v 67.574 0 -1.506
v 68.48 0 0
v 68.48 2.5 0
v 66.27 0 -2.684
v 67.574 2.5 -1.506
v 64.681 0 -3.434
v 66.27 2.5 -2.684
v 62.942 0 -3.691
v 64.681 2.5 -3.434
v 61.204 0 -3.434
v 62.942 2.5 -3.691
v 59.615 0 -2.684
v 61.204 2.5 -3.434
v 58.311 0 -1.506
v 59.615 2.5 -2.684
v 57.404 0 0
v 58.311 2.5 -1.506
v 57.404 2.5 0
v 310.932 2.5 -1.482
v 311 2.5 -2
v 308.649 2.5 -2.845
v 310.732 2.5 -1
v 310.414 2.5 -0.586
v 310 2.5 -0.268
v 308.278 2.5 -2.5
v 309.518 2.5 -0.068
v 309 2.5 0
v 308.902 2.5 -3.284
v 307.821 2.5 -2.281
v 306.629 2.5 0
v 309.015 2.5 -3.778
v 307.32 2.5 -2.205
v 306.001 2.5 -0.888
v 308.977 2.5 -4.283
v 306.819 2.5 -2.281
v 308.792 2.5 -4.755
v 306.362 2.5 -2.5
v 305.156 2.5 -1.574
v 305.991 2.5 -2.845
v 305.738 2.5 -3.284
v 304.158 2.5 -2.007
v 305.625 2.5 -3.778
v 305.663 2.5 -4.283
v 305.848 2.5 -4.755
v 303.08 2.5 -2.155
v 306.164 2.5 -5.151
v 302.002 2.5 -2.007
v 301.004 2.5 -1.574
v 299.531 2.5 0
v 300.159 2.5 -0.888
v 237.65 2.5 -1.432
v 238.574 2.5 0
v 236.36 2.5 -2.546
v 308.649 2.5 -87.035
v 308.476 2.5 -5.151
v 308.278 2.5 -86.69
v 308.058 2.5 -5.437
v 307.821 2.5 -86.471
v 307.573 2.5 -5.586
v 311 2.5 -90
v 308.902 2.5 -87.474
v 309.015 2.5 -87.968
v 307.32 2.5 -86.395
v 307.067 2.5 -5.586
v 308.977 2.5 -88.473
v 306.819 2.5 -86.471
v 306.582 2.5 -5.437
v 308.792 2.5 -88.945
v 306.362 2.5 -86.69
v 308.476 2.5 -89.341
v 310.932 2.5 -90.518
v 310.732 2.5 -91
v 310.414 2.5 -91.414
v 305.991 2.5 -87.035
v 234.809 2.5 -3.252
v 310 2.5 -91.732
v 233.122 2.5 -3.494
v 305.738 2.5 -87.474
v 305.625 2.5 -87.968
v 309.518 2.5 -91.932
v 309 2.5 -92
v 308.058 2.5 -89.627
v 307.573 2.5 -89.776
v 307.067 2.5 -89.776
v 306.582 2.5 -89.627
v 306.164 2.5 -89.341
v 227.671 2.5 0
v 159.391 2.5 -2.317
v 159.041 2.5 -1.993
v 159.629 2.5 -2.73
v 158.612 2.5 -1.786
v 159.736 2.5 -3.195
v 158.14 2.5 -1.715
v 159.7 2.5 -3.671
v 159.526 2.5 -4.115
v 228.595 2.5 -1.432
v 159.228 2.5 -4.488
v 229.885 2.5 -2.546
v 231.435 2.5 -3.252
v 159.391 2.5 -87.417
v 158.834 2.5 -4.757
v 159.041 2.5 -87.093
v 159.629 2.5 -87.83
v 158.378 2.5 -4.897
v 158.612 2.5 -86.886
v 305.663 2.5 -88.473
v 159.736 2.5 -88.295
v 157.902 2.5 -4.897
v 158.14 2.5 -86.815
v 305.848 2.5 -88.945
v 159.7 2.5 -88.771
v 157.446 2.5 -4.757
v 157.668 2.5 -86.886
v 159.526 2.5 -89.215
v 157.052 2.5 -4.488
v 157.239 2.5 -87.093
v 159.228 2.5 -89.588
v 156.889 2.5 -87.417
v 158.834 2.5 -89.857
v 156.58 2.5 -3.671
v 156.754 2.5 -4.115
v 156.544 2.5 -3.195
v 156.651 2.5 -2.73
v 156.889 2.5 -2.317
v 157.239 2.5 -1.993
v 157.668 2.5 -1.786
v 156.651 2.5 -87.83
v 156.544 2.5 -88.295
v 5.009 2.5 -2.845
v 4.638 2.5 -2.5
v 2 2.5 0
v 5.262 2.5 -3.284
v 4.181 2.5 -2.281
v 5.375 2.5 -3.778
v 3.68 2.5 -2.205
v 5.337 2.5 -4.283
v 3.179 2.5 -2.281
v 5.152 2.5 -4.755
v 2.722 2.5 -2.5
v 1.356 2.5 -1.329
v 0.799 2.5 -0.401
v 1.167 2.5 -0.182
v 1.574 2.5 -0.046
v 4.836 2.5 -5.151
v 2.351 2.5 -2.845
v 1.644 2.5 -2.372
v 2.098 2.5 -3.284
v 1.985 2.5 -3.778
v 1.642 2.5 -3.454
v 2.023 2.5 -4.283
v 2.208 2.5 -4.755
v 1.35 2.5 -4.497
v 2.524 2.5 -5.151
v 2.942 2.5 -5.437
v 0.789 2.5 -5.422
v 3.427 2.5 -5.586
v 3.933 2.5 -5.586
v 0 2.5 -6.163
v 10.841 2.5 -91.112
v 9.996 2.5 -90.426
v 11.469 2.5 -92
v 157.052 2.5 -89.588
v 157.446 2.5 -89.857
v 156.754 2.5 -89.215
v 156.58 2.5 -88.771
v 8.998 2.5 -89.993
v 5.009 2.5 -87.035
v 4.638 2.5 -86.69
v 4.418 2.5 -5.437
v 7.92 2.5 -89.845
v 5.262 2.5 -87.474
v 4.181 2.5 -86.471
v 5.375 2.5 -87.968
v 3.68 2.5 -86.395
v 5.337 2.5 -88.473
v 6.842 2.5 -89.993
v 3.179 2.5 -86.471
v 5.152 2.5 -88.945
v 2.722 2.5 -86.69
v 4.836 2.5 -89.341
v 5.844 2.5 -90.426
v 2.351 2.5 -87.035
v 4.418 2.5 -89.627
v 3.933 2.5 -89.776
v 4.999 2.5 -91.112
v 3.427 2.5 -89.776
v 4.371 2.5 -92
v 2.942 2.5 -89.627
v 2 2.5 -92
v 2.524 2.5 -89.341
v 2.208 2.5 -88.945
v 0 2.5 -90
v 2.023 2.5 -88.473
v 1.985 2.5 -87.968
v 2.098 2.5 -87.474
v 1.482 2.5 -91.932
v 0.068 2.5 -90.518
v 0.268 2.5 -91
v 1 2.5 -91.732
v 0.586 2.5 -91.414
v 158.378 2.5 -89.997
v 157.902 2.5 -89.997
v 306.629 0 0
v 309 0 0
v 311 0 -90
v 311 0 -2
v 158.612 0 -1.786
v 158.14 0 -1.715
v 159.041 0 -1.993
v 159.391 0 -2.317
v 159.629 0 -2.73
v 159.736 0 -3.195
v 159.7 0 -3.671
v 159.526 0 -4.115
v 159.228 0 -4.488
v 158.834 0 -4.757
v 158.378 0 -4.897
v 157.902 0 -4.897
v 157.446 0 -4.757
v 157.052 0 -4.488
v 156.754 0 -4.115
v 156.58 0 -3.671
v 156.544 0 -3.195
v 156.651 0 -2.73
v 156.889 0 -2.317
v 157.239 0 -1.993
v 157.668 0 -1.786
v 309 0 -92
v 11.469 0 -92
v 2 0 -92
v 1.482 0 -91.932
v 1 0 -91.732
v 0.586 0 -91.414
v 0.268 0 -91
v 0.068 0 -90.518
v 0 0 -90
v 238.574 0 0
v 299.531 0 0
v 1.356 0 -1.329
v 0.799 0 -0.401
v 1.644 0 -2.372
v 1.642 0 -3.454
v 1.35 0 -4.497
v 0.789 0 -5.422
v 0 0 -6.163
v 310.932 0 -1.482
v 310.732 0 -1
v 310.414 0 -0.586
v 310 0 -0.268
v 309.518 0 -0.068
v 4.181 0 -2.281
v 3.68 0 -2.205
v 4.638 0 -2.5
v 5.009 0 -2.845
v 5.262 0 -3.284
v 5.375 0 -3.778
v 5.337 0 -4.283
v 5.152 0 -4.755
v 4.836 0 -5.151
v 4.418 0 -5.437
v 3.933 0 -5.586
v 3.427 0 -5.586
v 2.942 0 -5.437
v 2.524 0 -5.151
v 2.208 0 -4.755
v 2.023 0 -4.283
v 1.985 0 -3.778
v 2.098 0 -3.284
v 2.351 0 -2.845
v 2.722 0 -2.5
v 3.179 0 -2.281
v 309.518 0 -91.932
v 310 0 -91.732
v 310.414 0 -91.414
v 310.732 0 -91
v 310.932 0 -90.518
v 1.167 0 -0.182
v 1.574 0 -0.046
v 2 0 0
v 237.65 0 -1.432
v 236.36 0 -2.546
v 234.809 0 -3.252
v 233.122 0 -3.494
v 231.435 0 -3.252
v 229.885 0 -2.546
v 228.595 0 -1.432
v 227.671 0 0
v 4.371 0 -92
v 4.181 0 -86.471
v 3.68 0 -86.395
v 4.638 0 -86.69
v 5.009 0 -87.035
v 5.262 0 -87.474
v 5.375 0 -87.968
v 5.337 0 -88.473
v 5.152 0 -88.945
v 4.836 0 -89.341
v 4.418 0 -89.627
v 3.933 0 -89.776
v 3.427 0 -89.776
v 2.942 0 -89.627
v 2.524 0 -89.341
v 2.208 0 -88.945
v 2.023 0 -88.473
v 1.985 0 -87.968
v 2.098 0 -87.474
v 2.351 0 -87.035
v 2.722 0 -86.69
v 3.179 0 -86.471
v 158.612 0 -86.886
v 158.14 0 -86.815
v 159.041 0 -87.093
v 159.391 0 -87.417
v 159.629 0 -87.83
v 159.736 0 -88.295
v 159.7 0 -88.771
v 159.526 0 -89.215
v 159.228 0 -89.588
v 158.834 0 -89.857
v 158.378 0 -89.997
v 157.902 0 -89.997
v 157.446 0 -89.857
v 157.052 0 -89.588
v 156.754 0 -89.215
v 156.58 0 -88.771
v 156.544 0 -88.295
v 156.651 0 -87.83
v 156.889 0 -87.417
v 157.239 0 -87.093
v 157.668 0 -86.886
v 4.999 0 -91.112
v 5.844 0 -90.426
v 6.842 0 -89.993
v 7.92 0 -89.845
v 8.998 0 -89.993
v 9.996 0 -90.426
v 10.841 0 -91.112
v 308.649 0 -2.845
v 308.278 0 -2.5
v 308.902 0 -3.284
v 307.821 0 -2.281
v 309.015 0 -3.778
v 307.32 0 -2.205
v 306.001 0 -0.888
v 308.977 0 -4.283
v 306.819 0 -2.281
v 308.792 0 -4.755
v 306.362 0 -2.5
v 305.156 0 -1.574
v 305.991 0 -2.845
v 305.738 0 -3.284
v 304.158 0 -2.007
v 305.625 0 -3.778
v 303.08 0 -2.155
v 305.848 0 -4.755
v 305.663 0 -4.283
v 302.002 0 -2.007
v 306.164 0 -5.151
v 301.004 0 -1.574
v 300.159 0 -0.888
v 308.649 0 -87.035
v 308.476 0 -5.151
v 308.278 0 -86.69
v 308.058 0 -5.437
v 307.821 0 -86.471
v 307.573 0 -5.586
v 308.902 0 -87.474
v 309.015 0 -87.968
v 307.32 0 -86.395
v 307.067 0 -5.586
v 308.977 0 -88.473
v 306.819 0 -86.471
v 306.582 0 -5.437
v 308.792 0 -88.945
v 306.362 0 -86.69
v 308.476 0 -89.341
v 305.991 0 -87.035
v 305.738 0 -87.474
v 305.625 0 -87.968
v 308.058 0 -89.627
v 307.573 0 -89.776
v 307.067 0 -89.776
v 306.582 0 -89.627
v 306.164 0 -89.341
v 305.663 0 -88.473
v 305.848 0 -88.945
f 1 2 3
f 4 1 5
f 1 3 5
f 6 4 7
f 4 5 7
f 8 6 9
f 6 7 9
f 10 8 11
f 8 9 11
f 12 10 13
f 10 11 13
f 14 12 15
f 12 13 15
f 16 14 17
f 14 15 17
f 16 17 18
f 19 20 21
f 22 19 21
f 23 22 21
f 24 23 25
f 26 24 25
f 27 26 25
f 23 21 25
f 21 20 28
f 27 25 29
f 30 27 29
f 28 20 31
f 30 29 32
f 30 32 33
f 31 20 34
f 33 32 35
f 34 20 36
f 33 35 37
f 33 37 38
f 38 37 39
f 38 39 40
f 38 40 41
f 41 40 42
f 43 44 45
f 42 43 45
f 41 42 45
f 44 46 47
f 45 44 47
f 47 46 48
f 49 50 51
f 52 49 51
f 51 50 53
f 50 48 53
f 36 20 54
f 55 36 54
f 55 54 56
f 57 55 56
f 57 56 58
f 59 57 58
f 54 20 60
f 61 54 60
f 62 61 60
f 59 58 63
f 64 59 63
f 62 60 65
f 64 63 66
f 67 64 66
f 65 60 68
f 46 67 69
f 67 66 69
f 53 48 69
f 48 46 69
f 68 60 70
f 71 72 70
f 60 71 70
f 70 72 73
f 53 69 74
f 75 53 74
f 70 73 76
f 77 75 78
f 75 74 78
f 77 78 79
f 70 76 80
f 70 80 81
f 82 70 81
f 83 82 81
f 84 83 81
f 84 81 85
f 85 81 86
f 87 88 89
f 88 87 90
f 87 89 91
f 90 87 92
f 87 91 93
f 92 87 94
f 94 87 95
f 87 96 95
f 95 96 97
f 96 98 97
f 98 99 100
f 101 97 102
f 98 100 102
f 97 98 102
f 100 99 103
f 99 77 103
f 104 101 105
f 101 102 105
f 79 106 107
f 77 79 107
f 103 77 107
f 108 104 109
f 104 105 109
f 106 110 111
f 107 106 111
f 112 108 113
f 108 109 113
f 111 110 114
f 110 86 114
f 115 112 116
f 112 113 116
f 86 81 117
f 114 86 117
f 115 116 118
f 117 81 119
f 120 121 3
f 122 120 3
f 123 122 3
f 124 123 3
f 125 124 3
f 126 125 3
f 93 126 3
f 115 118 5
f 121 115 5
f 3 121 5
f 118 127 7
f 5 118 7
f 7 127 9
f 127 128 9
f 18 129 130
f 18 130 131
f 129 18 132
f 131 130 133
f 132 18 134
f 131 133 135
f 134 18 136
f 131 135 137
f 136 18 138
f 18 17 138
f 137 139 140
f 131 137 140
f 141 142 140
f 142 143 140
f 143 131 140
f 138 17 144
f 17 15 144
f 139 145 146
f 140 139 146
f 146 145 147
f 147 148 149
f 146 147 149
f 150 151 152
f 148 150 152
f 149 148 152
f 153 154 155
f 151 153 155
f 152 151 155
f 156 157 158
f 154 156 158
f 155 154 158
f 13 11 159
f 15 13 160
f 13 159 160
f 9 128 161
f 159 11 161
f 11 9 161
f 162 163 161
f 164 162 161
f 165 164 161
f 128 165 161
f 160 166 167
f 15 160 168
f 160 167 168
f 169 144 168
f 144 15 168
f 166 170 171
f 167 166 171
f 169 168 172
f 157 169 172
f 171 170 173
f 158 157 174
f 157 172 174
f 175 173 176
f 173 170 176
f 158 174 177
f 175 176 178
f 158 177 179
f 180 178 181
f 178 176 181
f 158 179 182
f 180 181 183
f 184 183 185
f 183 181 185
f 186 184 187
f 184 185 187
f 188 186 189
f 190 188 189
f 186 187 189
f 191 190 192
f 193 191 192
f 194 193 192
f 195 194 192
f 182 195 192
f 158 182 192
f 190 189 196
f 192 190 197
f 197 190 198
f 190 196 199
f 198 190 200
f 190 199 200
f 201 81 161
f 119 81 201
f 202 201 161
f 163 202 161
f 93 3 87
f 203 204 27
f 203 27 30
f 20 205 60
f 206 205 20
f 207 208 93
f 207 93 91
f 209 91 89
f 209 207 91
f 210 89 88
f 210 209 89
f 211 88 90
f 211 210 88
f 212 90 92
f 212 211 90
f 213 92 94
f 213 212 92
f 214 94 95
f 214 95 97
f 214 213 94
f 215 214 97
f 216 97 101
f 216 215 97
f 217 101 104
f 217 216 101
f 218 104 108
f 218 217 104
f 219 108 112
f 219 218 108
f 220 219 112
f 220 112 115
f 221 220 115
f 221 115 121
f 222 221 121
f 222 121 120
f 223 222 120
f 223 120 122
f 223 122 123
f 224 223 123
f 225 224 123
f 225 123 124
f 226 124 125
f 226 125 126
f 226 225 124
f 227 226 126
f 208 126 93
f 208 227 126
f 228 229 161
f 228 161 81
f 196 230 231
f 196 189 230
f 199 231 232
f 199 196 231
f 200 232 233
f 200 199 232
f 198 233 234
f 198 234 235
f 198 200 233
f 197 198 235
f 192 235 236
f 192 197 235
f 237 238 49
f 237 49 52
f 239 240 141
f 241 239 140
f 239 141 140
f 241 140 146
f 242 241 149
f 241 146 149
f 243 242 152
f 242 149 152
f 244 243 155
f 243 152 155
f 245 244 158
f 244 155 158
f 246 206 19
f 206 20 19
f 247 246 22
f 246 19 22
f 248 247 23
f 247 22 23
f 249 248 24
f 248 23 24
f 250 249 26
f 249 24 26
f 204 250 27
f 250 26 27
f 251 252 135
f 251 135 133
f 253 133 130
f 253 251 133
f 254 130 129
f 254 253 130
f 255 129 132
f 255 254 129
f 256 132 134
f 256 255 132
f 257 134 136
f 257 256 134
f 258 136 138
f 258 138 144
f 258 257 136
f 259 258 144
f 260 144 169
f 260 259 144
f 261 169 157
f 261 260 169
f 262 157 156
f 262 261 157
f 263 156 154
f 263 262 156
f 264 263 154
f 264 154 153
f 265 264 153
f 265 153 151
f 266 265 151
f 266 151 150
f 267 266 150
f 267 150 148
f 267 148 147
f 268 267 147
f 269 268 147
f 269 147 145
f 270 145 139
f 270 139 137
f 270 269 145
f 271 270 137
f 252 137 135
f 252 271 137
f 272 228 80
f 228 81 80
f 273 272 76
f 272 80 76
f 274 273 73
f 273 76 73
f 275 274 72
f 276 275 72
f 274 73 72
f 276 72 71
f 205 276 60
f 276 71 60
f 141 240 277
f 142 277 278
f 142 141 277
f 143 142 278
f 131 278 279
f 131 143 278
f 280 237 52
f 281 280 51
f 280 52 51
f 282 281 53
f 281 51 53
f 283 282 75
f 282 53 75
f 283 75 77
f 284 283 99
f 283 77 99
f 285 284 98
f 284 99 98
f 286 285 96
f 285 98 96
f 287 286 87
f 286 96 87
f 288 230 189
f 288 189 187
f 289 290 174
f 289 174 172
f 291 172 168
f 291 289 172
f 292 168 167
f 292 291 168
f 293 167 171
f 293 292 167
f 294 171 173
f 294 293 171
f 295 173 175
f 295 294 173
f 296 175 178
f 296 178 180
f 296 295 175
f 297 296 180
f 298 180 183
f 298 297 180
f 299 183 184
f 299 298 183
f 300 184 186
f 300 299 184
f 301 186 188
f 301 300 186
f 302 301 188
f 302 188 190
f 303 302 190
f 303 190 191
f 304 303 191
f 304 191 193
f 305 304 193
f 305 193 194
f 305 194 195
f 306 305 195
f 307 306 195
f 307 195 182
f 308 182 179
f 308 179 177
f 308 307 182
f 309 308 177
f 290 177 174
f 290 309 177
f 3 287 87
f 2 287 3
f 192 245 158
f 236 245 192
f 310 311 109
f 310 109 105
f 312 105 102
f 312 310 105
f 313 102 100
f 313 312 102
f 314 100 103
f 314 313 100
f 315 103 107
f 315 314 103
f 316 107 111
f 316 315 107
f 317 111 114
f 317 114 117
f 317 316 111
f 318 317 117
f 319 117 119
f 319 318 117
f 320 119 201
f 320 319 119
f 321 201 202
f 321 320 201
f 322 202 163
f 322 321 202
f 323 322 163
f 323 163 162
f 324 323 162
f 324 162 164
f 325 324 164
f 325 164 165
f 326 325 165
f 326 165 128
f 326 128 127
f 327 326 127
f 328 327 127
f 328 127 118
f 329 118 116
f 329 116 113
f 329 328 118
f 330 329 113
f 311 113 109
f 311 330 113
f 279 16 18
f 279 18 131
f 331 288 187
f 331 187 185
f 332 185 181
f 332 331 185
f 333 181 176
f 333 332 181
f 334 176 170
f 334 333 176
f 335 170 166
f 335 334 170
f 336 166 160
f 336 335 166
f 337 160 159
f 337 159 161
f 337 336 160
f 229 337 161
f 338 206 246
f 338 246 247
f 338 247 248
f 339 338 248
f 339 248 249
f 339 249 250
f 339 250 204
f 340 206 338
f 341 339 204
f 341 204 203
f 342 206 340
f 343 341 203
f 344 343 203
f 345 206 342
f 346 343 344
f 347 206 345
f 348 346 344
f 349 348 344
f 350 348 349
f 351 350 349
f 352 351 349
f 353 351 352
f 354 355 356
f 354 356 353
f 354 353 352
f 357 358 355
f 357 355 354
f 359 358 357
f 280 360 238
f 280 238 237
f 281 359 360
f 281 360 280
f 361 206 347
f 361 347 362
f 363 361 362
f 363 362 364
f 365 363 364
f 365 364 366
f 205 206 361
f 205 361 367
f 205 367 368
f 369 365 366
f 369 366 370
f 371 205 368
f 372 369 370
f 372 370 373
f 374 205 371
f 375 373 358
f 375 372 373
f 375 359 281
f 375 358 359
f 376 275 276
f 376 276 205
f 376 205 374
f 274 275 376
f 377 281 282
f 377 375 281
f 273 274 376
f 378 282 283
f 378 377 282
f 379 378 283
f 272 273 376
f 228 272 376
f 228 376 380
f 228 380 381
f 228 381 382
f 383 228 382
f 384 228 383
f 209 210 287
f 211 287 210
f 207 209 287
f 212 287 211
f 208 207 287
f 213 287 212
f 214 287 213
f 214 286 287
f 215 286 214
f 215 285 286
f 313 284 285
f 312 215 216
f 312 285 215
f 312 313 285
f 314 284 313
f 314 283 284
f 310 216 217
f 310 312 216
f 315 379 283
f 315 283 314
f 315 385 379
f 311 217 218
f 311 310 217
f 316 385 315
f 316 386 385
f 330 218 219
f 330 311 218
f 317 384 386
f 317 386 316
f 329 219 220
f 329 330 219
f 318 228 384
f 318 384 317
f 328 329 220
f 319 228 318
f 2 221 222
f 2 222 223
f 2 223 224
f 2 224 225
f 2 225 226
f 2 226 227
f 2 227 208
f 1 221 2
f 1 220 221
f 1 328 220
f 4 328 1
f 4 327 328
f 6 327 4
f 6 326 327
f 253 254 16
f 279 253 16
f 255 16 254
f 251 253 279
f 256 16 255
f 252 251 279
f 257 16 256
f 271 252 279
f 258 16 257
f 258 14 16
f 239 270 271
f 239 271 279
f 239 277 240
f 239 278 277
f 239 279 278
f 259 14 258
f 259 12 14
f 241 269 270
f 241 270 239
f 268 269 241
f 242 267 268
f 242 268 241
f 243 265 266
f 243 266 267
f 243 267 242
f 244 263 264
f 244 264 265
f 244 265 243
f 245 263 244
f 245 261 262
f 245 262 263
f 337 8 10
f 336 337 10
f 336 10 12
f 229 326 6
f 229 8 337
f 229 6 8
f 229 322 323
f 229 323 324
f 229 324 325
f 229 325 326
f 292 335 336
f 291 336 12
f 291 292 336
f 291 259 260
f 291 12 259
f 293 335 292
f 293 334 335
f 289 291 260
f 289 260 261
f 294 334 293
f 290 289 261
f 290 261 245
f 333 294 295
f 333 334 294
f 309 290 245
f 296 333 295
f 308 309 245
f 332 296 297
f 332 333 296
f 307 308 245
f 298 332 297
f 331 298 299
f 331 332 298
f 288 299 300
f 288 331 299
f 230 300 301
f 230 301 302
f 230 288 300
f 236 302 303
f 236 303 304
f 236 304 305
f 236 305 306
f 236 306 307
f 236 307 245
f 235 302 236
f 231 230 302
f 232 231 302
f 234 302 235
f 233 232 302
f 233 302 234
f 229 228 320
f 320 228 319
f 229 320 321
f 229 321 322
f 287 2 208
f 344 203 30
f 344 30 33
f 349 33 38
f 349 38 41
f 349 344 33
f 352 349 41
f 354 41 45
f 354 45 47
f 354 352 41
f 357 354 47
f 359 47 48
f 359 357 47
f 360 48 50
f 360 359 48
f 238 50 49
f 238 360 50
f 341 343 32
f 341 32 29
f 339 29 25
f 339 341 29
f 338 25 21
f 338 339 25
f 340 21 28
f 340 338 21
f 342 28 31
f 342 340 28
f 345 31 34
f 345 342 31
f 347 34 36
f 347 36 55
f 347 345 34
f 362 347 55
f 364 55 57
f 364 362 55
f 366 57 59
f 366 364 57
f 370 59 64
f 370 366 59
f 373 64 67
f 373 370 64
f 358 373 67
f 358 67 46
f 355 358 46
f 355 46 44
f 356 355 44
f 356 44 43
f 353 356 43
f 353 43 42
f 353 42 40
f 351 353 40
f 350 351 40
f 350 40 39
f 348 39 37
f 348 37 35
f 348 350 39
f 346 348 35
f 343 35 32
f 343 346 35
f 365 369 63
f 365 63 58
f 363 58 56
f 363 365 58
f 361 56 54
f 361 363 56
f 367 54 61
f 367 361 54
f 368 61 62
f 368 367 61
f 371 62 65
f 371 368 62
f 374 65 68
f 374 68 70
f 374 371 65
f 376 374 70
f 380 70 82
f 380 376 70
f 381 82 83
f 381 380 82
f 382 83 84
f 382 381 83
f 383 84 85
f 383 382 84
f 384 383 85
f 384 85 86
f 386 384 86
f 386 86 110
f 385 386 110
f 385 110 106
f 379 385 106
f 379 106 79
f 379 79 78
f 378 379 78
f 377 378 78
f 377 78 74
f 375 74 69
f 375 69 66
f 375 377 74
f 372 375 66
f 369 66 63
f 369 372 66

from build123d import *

# Parameters (mm, degrees)
SKETCH_1_R          = 1.7
SKETCH_1_R_2        = 1.6
EXTRUDE_1_DEPTH     = 2.5
FILLET_1_R          = 2
SKETCH_2_R          = 4
CUT_EXTRUDE_1_DEPTH = 325.332005821
SKETCH_3_R          = 6
CUT_EXTRUDE_2_DEPTH = 325.332005821


with BuildPart() as part:
    # 草图1 → 凸台-拉伸1 (new body)
    with BuildSketch(Plane(origin=(0, 0, 0), x_dir=(1, 0, 0), z_dir=(0, 1, 0))):
        with BuildLine():
            Line((0, 92), (4.370919133, 92))
            ThreePointArc((4.370919133, 92), (7.92, 89.845), (11.469080867, 92))
            Line((11.469080867, 92), (311, 92))
            Line((311, 92), (311, 0))
            Line((311, 0), (306.629080867, 0))
            ThreePointArc((306.629080867, 0), (303.08, 2.155), (299.530919133, 0))
            Line((299.530919133, 0), (0, 0))
            Line((0, 0), (0, 92))
        make_face()
        with Locations((3.68, 88.095)):
            Circle(SKETCH_1_R, mode=Mode.SUBTRACT)
        with Locations((307.32, 88.095)):
            Circle(SKETCH_1_R, mode=Mode.SUBTRACT)
        with Locations((307.32, 3.905)):
            Circle(SKETCH_1_R, mode=Mode.SUBTRACT)
        with Locations((3.68, 3.905)):
            Circle(SKETCH_1_R, mode=Mode.SUBTRACT)
        with Locations((158.14, 88.415)):
            Circle(SKETCH_1_R_2, mode=Mode.SUBTRACT)
        with Locations((158.14, 3.315)):
            Circle(SKETCH_1_R_2, mode=Mode.SUBTRACT)
    extrude(amount=EXTRUDE_1_DEPTH)

    # 圆角1
    fillet_1_edges = [part.edges().sort_by_distance(p)[0] for p in [
        (311, 1.25, -92),
        (0, 1.25, 0),
        (0, 1.25, -92),
        (311, 1.25, 0),
    ]]
    fillet(fillet_1_edges, radius=FILLET_1_R)

    # 草图2 → 切除-拉伸1 (cut, through all)
    with BuildSketch(Plane(origin=(0, 2.5, 0), x_dir=(1, 0, 0), z_dir=(0, 1, 0))):
        with Locations((-2.32, 2.905)):
            Circle(SKETCH_2_R)
    extrude(amount=-CUT_EXTRUDE_1_DEPTH, mode=Mode.SUBTRACT)

    # 草图3 → 切除-拉伸2 (cut, through all)
    with BuildSketch(Plane(origin=(0, 2.5, 0), x_dir=(1, 0, 0), z_dir=(0, 1, 0))):
        with Locations((233.122222663, -2.505770404)):
            Circle(SKETCH_3_R)
        with Locations((62.9423368, -2.308672799)):
            Circle(SKETCH_3_R)
    extrude(amount=-CUT_EXTRUDE_2_DEPTH, mode=Mode.SUBTRACT)


solid = part.part
